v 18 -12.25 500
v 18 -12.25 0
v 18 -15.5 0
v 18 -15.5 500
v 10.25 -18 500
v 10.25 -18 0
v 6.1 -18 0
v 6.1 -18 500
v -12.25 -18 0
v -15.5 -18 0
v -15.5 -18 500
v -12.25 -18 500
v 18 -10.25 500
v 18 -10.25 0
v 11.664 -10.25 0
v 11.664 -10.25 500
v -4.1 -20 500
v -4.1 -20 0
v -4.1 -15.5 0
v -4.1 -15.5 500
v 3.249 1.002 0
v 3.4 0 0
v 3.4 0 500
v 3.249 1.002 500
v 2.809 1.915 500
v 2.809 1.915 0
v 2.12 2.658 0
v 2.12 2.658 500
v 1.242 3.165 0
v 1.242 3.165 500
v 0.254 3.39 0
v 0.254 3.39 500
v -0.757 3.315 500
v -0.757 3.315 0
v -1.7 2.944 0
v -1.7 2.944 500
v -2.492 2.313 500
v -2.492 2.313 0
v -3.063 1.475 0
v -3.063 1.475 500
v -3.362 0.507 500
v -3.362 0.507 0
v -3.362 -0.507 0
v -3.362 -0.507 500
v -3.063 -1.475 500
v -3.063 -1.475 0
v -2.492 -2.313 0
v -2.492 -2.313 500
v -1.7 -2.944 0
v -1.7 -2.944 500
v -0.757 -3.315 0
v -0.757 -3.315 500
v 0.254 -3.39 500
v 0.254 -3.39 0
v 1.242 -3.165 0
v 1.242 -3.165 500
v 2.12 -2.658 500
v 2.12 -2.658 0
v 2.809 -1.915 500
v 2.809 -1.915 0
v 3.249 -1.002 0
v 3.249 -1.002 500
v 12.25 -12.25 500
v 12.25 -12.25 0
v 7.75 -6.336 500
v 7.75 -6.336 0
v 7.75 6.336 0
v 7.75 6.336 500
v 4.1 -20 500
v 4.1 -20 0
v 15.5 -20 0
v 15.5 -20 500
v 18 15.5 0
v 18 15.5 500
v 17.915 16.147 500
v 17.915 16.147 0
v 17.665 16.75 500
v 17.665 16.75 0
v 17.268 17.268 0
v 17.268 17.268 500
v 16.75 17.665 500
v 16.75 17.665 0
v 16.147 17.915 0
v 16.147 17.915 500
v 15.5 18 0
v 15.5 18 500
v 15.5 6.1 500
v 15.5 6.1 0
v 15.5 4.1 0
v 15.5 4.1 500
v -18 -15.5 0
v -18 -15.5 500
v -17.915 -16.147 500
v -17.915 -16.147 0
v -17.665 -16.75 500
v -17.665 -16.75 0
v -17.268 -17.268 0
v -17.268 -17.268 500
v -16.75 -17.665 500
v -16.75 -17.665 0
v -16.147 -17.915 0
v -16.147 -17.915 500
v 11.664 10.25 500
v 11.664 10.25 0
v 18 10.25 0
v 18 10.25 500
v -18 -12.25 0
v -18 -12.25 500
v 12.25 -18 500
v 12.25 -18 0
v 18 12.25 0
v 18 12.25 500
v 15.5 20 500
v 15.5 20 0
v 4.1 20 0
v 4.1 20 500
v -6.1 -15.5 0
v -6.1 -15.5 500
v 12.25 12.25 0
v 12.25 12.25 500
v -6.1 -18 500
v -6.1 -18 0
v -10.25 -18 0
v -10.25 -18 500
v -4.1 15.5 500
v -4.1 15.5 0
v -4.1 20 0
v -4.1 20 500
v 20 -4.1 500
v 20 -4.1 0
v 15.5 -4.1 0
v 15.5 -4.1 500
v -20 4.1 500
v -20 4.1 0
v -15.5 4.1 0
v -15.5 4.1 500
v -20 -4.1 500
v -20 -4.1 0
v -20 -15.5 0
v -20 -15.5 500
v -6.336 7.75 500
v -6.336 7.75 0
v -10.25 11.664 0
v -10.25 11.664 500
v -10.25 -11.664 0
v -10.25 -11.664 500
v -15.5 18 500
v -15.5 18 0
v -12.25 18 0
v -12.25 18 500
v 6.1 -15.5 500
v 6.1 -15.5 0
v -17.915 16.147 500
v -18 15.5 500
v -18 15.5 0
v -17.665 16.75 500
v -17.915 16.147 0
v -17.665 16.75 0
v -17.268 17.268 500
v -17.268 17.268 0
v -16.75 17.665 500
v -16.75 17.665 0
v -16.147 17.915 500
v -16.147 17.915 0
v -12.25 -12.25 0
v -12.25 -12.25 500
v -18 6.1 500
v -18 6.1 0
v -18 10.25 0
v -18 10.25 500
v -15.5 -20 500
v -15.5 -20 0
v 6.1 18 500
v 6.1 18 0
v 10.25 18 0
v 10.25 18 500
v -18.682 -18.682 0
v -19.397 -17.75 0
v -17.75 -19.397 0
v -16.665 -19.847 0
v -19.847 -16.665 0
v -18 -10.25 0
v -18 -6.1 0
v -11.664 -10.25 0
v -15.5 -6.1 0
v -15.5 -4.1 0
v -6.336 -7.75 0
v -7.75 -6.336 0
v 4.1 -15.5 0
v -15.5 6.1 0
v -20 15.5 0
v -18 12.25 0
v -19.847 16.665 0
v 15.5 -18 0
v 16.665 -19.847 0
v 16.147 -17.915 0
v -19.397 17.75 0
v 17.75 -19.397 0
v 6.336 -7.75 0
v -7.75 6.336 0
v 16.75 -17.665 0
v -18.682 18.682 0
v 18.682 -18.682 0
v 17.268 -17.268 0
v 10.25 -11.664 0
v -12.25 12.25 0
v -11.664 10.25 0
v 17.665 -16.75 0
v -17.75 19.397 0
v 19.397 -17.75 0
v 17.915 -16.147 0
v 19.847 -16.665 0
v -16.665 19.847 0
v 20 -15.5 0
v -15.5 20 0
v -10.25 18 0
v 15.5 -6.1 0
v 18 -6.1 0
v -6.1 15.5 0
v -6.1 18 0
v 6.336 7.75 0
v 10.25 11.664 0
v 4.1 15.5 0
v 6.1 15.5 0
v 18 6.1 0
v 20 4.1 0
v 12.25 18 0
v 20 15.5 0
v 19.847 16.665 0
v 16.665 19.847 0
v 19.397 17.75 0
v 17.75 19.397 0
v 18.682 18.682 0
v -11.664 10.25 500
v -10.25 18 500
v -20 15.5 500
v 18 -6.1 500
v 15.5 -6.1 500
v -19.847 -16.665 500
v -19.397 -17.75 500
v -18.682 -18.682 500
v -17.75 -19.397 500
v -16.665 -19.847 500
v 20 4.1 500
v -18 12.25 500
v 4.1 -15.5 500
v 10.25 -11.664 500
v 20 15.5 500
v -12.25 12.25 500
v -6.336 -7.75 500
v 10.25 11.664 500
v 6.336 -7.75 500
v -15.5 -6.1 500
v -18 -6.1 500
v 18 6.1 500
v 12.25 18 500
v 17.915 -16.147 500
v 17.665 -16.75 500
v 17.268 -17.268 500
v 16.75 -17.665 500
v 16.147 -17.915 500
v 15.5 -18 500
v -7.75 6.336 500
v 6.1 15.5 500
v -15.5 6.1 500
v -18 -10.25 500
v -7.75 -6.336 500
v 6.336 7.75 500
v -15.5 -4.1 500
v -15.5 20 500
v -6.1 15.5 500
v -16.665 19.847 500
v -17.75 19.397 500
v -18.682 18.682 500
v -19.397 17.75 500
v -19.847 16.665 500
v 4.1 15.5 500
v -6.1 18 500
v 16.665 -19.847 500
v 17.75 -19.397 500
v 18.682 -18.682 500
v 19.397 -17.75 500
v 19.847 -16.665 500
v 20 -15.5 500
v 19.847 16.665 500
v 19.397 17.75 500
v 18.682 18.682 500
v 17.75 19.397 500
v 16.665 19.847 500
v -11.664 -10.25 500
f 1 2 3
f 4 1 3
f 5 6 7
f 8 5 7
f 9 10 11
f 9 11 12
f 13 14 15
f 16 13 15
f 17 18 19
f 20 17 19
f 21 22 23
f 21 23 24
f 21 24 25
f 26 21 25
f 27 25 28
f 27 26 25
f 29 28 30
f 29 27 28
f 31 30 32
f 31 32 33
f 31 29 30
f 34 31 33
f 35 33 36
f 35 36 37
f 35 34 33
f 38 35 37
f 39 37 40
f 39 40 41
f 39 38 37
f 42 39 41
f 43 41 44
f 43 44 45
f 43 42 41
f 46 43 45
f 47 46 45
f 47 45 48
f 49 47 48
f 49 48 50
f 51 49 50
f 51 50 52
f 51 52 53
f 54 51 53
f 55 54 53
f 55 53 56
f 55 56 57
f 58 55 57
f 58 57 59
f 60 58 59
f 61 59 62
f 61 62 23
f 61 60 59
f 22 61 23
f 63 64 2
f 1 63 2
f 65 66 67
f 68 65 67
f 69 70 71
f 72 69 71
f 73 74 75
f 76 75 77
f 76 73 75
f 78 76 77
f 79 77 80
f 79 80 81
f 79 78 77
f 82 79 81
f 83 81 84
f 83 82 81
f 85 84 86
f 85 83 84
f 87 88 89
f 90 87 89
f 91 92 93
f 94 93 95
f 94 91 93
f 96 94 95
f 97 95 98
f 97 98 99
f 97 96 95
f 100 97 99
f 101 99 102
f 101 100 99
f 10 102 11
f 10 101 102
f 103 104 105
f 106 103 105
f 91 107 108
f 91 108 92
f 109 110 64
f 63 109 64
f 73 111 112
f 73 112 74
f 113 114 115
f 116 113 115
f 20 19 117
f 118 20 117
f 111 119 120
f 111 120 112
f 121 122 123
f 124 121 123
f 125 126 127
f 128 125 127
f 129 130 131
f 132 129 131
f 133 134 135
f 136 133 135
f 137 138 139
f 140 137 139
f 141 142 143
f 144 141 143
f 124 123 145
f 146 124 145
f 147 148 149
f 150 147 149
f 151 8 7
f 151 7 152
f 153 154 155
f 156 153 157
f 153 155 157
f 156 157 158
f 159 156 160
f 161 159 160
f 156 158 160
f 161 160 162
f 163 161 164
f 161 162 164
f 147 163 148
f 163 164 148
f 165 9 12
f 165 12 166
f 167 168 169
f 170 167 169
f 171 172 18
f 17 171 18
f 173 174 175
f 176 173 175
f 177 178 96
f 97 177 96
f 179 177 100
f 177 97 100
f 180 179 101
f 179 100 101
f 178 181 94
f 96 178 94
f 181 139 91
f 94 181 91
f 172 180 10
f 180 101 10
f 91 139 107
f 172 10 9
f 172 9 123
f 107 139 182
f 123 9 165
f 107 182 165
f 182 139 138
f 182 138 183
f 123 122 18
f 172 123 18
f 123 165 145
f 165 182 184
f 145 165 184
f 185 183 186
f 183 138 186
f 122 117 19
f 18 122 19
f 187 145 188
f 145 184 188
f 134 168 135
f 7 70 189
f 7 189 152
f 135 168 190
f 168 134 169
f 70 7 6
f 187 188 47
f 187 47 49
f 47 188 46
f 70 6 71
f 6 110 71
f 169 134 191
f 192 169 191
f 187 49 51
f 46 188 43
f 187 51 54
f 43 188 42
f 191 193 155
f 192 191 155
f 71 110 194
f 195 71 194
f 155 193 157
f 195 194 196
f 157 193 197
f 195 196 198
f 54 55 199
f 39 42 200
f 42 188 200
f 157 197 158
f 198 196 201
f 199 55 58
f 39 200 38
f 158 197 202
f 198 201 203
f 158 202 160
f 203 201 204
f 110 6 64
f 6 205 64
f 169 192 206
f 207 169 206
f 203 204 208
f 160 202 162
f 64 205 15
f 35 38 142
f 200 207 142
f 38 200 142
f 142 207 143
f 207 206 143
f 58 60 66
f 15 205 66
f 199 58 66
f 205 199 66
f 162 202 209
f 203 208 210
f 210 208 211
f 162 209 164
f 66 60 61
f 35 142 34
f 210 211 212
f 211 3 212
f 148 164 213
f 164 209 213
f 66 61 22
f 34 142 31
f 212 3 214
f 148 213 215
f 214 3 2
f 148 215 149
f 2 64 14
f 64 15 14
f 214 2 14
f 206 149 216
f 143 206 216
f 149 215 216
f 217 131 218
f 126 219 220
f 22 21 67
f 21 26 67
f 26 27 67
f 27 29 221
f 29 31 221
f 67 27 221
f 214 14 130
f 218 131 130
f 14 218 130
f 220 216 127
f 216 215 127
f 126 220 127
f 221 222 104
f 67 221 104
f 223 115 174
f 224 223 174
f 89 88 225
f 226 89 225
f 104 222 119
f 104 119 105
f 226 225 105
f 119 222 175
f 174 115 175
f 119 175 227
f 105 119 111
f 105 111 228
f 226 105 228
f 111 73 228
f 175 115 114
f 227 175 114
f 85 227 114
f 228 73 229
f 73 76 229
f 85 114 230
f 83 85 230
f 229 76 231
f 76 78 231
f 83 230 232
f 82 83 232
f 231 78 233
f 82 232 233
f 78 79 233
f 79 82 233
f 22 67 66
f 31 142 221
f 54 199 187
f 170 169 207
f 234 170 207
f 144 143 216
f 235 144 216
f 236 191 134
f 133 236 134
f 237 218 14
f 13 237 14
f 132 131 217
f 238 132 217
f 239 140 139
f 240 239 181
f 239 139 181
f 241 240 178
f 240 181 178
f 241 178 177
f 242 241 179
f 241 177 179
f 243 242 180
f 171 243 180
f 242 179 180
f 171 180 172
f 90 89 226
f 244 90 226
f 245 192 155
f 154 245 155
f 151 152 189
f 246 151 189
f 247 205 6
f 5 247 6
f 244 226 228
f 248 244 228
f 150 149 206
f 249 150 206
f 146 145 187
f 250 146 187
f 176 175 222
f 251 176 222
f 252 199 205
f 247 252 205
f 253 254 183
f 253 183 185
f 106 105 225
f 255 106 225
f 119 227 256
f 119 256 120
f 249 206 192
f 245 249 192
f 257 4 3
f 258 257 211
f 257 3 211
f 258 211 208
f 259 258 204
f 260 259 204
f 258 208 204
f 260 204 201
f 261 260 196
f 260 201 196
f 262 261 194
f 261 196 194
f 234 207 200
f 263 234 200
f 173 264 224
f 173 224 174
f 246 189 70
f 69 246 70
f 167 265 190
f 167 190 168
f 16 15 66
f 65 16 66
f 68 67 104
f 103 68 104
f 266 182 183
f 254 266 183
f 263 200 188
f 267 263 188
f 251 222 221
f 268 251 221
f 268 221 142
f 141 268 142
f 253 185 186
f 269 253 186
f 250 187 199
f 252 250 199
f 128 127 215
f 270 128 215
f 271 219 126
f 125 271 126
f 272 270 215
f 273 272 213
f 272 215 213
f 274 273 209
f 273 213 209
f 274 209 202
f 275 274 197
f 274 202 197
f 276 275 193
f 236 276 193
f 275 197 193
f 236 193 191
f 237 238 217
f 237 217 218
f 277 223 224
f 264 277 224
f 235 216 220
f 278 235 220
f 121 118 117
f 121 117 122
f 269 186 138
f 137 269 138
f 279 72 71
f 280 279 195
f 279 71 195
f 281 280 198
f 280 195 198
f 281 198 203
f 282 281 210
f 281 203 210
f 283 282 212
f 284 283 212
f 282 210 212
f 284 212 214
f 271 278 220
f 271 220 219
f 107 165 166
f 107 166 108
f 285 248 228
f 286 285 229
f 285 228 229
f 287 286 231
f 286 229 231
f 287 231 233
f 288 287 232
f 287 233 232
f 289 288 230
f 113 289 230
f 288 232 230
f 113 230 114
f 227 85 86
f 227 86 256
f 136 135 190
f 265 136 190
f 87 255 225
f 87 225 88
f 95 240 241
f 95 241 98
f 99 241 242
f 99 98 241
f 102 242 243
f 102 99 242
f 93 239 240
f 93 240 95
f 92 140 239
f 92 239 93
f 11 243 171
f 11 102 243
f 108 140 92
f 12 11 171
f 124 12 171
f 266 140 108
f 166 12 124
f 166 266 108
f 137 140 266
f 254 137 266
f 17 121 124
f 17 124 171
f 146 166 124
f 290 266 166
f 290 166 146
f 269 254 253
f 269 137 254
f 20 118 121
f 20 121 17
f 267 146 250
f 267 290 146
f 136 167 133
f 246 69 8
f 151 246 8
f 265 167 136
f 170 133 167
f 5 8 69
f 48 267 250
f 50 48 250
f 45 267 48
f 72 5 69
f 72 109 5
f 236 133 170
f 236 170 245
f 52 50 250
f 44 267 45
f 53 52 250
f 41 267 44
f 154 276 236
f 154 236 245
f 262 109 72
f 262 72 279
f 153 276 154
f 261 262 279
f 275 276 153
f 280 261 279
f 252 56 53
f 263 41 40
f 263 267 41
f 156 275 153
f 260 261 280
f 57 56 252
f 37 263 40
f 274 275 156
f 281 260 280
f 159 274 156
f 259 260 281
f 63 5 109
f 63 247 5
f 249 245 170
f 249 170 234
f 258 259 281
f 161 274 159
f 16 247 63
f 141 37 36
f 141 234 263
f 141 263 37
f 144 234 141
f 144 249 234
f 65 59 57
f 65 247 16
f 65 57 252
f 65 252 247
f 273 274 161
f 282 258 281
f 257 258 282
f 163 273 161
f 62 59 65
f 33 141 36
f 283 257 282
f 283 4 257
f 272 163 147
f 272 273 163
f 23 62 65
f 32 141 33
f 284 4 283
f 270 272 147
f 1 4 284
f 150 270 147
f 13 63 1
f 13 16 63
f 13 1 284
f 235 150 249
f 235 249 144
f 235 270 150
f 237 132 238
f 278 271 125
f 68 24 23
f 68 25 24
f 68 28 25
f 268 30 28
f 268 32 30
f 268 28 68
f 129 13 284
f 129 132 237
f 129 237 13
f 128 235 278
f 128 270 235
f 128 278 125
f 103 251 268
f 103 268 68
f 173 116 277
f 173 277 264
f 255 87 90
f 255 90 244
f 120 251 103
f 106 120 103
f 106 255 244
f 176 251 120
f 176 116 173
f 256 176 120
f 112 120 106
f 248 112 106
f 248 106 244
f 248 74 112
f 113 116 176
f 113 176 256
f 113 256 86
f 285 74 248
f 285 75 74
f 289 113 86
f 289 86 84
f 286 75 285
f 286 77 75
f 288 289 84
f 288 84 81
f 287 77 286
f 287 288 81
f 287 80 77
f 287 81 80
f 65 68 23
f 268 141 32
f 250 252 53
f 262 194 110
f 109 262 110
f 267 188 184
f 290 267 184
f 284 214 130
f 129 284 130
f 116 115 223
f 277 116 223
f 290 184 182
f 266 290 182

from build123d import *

# Parameters (mm, degrees)
SKETCH1_R           = 3.4
BOSS_EXTRUDE1_DEPTH = 500


with BuildPart() as part:
    # Sketch1 → Boss-Extrude1 (new body)
    with BuildSketch(Plane.XY):
        with BuildLine():
            Line((7.75, -6.335786438), (7.75, 6.335786438))
            Line((7.75, 6.335786438), (11.664213562, 10.25))
            Line((11.664213562, 10.25), (18, 10.25))
            Line((18, 10.25), (18, 6.1))
            Line((18, 6.1), (15.5, 6.1))
            Line((15.5, 6.1), (15.5, 4.1))
            Line((15.5, 4.1), (20, 4.1))
            Line((20, 4.1), (20, 15.5))
            ThreePointArc((20, 15.5), (18.681980515, 18.681980515), (15.5, 20))
            Line((15.5, 20), (4.1, 20))
            Line((4.1, 20), (4.1, 15.5))
            Line((4.1, 15.5), (6.1, 15.5))
            Line((6.1, 15.5), (6.1, 18))
            Line((6.1, 18), (10.25, 18))
            Line((10.25, 18), (10.25, 11.664213562))
            Line((10.25, 11.664213562), (6.335786438, 7.75))
            Line((6.335786438, 7.75), (-6.335786438, 7.75))
            Line((-6.335786438, 7.75), (-10.25, 11.664213562))
            Line((-10.25, 11.664213562), (-10.25, 18))
            Line((-10.25, 18), (-6.1, 18))
            Line((-6.1, 18), (-6.1, 15.5))
            Line((-6.1, 15.5), (-4.1, 15.5))
            Line((-4.1, 15.5), (-4.1, 20))
            Line((-4.1, 20), (-15.5, 20))
            ThreePointArc((-15.5, 20), (-18.681980515, 18.681980515), (-20, 15.5))
            Line((-20, 15.5), (-20, 4.1))
            Line((-20, 4.1), (-15.5, 4.1))
            Line((-15.5, 4.1), (-15.5, 6.1))
            Line((-15.5, 6.1), (-18, 6.1))
            Line((-18, 6.1), (-18, 10.25))
            Line((-18, 10.25), (-11.664213562, 10.25))
            Line((-11.664213562, 10.25), (-7.75, 6.335786438))
            Line((-7.75, 6.335786438), (-7.75, -6.335786438))
            Line((-7.75, -6.335786438), (-11.664213562, -10.25))
            Line((-11.664213562, -10.25), (-18, -10.25))
            Line((-18, -10.25), (-18, -6.1))
            Line((-18, -6.1), (-15.5, -6.1))
            Line((-15.5, -6.1), (-15.5, -4.1))
            Line((-15.5, -4.1), (-20, -4.1))
            Line((-20, -4.1), (-20, -15.5))
            ThreePointArc((-20, -15.5), (-18.681980515, -18.681980515), (-15.5, -20))
            Line((-15.5, -20), (-4.1, -20))
            Line((-4.1, -20), (-4.1, -15.5))
            Line((-4.1, -15.5), (-6.1, -15.5))
            Line((-6.1, -15.5), (-6.1, -18))
            Line((-6.1, -18), (-10.25, -18))
            Line((-10.25, -18), (-10.25, -11.664213562))
            Line((-10.25, -11.664213562), (-6.335786438, -7.75))
            Line((-6.335786438, -7.75), (6.335786438, -7.75))
            Line((6.335786438, -7.75), (10.25, -11.664213562))
            Line((10.25, -11.664213562), (10.25, -18))
            Line((10.25, -18), (6.1, -18))
            Line((6.1, -18), (6.1, -15.5))
            Line((6.1, -15.5), (4.1, -15.5))
            Line((4.1, -15.5), (4.1, -20))
            Line((4.1, -20), (15.5, -20))
            ThreePointArc((15.5, -20), (18.681980515, -18.681980515), (20, -15.5))
            Line((20, -15.5), (20, -4.1))
            Line((20, -4.1), (15.5, -4.1))
            Line((15.5, -4.1), (15.5, -6.1))
            Line((15.5, -6.1), (18, -6.1))
            Line((18, -6.1), (18, -10.25))
            Line((18, -10.25), (11.664213562, -10.25))
            Line((11.664213562, -10.25), (7.75, -6.335786438))
        make_face()
        Circle(SKETCH1_R, mode=Mode.SUBTRACT)
        with BuildLine():
            Line((15.5, 18), (12.25, 18))
            Line((12.25, 18), (12.25, 12.25))
            Line((12.25, 12.25), (18, 12.25))
            Line((18, 12.25), (18, 15.5))
            ThreePointArc((18, 15.5), (17.267766953, 17.267766953), (15.5, 18))
        make_face(mode=Mode.SUBTRACT)
        with BuildLine():
            Line((-15.5, 18), (-12.25, 18))
            Line((-12.25, 18), (-12.25, 12.25))
            Line((-12.25, 12.25), (-18, 12.25))
            Line((-18, 12.25), (-18, 15.5))
            ThreePointArc((-18, 15.5), (-17.267766953, 17.267766953), (-15.5, 18))
        make_face(mode=Mode.SUBTRACT)
        with BuildLine():
            Line((-15.5, -18), (-12.25, -18))
            Line((-12.25, -18), (-12.25, -12.25))
            Line((-12.25, -12.25), (-18, -12.25))
            Line((-18, -12.25), (-18, -15.5))
            ThreePointArc((-18, -15.5), (-17.267766953, -17.267766953), (-15.5, -18))
        make_face(mode=Mode.SUBTRACT)
        with BuildLine():
            Line((15.5, -18), (12.25, -18))
            Line((12.25, -18), (12.25, -12.25))
            Line((12.25, -12.25), (18, -12.25))
            Line((18, -12.25), (18, -15.5))
            ThreePointArc((18, -15.5), (17.267766953, -17.267766953), (15.5, -18))
        make_face(mode=Mode.SUBTRACT)
    extrude(amount=BOSS_EXTRUDE1_DEPTH)


solid = part.part
